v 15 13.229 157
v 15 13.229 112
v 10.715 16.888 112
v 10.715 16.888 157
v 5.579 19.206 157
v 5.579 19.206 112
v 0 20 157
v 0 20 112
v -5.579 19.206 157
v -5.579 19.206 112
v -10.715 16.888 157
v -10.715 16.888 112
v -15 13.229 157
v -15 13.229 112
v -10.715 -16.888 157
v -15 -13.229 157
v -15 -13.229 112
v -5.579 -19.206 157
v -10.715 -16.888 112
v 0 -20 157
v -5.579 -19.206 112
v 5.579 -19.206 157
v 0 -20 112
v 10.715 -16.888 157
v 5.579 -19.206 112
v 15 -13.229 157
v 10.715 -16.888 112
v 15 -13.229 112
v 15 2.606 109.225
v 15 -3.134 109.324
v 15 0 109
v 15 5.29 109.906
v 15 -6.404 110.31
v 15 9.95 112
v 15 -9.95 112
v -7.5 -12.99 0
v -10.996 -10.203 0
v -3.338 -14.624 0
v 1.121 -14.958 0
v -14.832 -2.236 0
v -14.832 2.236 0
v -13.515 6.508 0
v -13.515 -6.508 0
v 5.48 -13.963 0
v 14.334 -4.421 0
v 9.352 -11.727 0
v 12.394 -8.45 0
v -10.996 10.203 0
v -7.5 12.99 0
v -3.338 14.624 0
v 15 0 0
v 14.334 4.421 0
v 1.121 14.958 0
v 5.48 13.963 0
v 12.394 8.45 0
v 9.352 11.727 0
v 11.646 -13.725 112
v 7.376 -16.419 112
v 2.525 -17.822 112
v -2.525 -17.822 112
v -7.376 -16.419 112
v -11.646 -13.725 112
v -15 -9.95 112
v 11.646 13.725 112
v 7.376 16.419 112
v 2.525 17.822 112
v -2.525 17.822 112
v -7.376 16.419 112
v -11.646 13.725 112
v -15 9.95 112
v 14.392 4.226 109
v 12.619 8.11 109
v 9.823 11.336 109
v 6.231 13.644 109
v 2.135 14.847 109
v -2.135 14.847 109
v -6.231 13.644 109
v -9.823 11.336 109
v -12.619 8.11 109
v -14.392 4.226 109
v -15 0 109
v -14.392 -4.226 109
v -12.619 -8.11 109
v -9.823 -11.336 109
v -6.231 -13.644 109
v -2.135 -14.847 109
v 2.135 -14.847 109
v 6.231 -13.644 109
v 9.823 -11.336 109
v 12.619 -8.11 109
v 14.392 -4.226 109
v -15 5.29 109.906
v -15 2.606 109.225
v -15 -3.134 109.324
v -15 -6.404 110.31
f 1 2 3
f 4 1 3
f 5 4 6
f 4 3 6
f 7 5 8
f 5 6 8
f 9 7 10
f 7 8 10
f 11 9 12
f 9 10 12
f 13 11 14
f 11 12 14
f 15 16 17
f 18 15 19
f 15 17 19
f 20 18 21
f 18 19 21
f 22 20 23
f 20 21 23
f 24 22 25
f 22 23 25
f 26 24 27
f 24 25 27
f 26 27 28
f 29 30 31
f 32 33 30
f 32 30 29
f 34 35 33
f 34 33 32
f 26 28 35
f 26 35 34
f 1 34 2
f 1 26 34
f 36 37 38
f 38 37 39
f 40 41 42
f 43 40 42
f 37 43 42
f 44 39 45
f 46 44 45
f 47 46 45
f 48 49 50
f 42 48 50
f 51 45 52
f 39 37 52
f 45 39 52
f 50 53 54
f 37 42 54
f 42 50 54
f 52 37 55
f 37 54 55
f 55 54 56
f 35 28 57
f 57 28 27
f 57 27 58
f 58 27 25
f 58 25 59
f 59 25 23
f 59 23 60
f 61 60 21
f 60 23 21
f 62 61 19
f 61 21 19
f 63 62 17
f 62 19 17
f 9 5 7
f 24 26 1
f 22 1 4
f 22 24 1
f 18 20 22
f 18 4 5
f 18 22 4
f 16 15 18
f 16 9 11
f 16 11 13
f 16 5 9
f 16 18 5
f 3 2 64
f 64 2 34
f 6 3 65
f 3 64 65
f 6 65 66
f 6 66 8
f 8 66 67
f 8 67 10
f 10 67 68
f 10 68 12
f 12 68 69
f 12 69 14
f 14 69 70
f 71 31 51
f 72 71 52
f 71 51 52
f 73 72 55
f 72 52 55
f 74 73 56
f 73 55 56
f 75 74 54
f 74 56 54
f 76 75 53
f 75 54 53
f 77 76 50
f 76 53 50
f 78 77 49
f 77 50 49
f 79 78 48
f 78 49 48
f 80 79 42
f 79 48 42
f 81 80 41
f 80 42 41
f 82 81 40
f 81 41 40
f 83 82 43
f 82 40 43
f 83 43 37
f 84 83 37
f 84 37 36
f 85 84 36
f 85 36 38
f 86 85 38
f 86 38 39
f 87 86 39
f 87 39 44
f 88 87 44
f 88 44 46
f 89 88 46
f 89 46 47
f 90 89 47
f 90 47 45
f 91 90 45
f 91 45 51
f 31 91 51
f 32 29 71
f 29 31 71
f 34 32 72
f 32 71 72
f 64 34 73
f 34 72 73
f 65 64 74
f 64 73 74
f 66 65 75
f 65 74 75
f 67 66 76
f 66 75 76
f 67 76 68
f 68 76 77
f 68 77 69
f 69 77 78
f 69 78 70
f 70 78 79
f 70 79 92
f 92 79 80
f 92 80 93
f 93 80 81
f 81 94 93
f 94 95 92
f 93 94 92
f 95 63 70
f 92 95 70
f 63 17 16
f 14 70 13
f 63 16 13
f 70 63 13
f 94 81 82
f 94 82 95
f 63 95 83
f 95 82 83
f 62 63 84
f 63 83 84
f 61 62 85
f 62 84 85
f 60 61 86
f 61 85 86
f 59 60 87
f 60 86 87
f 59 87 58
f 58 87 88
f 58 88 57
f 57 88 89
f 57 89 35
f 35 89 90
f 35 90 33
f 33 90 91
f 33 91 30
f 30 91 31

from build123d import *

# Parameters (mm, degrees)
SKETCH_1_R          = 15
EXTRUDE_1_DEPTH     = 112
SKETCH_2_R          = 20
EXTRUDE_2_DEPTH     = 45
CHAMFER_1_SIZE      = 3
SKETCH_3_W          = 15.452934815
SKETCH_3_H          = 42.066322552
CUT_EXTRUDE_3_DEPTH = 160.527427109


with BuildPart() as part:
    # Эскиз1 → Вытянуть1 (new body)
    with BuildSketch(Plane.XY):
        Circle(SKETCH_1_R)
    extrude(amount=EXTRUDE_1_DEPTH)

    # Эскиз2 → Вытянуть2 (add)
    with BuildSketch(Plane.XY.offset(112)):
        with Locations(Location((0, 0, 0), (0, 0, 180))):
            Circle(SKETCH_2_R)
    extrude(amount=EXTRUDE_2_DEPTH)

    # Фаска1
    chamfer_1_edges = [part.edges().sort_by_distance(p)[0] for p in [
        (-15, 0, 112),
    ]]
    chamfer(chamfer_1_edges, length=CHAMFER_1_SIZE)

    # Эскиз3 → Вытянуть3 (cut, through all)
    with BuildSketch(Plane.XY.offset(157)):
        with Locations((22.726467408, -0.268280118)):
            Rectangle(SKETCH_3_W, SKETCH_3_H)
        with Locations((-22.726467408, -0.268280118)):
            Rectangle(SKETCH_3_W, SKETCH_3_H)
    extrude(amount=-CUT_EXTRUDE_3_DEPTH, mode=Mode.SUBTRACT)


solid = part.part
